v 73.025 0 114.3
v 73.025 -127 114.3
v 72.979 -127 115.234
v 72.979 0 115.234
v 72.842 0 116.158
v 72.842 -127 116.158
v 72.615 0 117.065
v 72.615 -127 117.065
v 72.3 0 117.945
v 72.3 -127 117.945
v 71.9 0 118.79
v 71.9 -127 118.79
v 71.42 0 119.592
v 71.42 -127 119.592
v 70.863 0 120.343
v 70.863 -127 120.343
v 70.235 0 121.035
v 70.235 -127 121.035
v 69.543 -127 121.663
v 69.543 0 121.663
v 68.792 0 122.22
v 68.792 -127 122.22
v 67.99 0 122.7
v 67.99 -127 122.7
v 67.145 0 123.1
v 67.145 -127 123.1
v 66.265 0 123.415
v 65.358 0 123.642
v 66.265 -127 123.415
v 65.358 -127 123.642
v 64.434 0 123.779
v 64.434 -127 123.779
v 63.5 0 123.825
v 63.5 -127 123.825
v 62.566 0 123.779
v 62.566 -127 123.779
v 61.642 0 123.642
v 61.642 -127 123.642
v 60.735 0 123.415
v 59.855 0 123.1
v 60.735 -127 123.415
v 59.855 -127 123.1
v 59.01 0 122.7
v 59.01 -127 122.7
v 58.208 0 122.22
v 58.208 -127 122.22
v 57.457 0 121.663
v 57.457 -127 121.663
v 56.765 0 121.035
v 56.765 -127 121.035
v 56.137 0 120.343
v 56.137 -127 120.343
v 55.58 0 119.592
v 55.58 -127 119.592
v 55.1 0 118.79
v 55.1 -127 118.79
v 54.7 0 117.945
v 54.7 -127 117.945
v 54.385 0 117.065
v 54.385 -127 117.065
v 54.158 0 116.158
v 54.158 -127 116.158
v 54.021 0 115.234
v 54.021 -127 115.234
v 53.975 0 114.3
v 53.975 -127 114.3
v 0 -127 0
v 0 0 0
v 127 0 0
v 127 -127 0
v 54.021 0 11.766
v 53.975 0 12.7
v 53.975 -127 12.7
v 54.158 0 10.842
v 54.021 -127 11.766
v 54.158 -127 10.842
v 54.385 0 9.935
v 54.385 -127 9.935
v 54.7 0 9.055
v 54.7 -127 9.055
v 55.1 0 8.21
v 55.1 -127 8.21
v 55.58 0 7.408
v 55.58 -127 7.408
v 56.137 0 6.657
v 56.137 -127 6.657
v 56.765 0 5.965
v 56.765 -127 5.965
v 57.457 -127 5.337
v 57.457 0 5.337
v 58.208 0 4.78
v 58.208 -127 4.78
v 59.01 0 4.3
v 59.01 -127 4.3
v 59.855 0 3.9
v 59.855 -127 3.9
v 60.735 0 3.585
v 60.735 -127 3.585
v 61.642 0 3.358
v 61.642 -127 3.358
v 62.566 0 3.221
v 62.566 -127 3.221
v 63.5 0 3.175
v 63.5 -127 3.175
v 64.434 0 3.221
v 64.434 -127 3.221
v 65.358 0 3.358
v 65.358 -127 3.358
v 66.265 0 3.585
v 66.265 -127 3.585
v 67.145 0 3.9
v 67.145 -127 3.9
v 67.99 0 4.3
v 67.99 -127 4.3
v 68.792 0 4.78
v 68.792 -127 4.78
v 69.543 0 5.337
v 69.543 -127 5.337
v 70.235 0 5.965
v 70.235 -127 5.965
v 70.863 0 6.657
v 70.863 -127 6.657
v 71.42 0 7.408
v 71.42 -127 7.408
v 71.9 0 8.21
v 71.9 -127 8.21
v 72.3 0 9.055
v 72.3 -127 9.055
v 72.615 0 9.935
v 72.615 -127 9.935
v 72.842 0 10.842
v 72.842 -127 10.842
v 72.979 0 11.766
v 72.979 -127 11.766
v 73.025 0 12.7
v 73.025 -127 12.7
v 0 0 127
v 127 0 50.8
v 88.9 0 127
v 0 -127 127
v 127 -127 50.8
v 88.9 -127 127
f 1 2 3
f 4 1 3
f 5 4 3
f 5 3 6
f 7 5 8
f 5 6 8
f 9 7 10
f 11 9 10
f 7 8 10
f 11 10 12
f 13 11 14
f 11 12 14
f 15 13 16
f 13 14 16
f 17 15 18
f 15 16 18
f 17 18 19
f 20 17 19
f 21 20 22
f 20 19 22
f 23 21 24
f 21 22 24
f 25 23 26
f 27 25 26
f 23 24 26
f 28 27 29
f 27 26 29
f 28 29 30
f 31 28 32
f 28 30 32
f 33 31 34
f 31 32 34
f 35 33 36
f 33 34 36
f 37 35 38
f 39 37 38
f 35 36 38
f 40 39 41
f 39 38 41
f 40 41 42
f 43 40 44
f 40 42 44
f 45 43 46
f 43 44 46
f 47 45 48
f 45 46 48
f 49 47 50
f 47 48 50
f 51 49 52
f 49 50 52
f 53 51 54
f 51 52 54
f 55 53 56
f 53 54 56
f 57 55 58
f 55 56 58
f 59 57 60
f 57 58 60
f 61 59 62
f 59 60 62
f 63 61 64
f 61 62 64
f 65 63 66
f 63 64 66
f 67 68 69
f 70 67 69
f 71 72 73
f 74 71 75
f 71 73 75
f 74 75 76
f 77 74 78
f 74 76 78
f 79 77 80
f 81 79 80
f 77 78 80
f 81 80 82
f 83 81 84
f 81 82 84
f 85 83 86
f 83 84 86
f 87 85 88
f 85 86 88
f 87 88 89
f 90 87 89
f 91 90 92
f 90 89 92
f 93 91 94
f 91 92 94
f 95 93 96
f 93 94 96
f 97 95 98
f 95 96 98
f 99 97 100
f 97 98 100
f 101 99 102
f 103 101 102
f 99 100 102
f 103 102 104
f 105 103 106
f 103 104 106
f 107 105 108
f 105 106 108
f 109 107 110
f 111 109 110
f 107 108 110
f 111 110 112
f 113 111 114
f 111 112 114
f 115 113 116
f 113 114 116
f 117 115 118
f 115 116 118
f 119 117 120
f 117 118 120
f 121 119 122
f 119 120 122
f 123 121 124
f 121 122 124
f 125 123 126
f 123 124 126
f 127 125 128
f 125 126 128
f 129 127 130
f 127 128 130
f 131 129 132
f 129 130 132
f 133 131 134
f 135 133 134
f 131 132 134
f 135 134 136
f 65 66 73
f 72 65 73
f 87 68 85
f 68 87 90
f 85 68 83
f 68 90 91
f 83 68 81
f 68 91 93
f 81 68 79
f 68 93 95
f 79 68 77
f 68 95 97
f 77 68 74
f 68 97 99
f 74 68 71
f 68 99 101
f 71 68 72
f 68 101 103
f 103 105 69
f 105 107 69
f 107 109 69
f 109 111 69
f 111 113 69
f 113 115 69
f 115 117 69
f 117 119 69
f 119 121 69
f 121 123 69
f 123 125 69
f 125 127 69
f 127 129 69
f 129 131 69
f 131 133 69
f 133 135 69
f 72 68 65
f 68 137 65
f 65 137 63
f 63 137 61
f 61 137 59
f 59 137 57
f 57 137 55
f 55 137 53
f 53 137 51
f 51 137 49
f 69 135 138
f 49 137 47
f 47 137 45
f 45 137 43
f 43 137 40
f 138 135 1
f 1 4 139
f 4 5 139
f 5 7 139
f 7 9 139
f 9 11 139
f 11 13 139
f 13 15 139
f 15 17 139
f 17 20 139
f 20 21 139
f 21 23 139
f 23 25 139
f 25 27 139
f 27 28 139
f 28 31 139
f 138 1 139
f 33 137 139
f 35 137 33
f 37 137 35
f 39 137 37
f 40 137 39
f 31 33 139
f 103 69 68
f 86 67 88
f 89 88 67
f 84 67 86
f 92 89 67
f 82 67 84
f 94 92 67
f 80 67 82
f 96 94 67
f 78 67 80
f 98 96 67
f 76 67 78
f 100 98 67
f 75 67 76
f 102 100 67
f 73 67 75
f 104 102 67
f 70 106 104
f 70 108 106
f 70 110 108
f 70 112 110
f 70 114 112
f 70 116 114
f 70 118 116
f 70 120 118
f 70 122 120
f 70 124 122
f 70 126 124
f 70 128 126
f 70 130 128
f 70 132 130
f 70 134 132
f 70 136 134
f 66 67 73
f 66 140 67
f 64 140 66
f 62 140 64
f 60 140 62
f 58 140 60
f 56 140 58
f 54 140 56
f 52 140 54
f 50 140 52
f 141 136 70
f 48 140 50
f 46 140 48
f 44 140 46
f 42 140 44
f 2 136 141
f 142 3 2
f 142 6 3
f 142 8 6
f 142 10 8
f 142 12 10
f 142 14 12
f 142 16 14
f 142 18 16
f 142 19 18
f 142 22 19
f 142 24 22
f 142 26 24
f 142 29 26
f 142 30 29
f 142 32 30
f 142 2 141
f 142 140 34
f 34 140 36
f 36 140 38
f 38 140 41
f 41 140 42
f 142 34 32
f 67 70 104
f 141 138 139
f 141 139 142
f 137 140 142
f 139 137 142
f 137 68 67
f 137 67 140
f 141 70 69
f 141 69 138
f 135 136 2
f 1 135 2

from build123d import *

# Parameters (mm, degrees)
F0_W     = 127
F0_H     = 127
F1_DEPTH = 127
F3_DEPTH = 127
F4_SIZE2 = 76.2
F4_SIZE  = 38.1


with BuildPart() as f1:
    # F0 (on Front) → F1 (new body)
    with BuildSketch(Plane.XZ):
        with Locations((63.5, 63.5)):
            Rectangle(F0_W, F0_H)
    extrude(amount=F1_DEPTH)

    # F2 (on face) → F3 (cut, through all)
    with BuildSketch(Plane.XZ.offset(127)):
        with BuildLine():
            Line((73.025, 12.7), (73.025, 114.3))
            ThreePointArc((73.025, 114.3), (63.5, 123.825), (53.975, 114.3))
            Line((53.975, 114.3), (53.975, 12.7))
            ThreePointArc((53.975, 12.7), (63.5, 3.175), (73.025, 12.7))
        make_face()
    extrude(amount=-F3_DEPTH, mode=Mode.SUBTRACT)

    # F4
    f4_edges = [f1.edges().sort_by_distance(p)[0] for p in [
        (127, -63.5, 127),
    ]]
    chamfer(f4_edges, length=F4_SIZE, length2=F4_SIZE2)


solid = f1.part
